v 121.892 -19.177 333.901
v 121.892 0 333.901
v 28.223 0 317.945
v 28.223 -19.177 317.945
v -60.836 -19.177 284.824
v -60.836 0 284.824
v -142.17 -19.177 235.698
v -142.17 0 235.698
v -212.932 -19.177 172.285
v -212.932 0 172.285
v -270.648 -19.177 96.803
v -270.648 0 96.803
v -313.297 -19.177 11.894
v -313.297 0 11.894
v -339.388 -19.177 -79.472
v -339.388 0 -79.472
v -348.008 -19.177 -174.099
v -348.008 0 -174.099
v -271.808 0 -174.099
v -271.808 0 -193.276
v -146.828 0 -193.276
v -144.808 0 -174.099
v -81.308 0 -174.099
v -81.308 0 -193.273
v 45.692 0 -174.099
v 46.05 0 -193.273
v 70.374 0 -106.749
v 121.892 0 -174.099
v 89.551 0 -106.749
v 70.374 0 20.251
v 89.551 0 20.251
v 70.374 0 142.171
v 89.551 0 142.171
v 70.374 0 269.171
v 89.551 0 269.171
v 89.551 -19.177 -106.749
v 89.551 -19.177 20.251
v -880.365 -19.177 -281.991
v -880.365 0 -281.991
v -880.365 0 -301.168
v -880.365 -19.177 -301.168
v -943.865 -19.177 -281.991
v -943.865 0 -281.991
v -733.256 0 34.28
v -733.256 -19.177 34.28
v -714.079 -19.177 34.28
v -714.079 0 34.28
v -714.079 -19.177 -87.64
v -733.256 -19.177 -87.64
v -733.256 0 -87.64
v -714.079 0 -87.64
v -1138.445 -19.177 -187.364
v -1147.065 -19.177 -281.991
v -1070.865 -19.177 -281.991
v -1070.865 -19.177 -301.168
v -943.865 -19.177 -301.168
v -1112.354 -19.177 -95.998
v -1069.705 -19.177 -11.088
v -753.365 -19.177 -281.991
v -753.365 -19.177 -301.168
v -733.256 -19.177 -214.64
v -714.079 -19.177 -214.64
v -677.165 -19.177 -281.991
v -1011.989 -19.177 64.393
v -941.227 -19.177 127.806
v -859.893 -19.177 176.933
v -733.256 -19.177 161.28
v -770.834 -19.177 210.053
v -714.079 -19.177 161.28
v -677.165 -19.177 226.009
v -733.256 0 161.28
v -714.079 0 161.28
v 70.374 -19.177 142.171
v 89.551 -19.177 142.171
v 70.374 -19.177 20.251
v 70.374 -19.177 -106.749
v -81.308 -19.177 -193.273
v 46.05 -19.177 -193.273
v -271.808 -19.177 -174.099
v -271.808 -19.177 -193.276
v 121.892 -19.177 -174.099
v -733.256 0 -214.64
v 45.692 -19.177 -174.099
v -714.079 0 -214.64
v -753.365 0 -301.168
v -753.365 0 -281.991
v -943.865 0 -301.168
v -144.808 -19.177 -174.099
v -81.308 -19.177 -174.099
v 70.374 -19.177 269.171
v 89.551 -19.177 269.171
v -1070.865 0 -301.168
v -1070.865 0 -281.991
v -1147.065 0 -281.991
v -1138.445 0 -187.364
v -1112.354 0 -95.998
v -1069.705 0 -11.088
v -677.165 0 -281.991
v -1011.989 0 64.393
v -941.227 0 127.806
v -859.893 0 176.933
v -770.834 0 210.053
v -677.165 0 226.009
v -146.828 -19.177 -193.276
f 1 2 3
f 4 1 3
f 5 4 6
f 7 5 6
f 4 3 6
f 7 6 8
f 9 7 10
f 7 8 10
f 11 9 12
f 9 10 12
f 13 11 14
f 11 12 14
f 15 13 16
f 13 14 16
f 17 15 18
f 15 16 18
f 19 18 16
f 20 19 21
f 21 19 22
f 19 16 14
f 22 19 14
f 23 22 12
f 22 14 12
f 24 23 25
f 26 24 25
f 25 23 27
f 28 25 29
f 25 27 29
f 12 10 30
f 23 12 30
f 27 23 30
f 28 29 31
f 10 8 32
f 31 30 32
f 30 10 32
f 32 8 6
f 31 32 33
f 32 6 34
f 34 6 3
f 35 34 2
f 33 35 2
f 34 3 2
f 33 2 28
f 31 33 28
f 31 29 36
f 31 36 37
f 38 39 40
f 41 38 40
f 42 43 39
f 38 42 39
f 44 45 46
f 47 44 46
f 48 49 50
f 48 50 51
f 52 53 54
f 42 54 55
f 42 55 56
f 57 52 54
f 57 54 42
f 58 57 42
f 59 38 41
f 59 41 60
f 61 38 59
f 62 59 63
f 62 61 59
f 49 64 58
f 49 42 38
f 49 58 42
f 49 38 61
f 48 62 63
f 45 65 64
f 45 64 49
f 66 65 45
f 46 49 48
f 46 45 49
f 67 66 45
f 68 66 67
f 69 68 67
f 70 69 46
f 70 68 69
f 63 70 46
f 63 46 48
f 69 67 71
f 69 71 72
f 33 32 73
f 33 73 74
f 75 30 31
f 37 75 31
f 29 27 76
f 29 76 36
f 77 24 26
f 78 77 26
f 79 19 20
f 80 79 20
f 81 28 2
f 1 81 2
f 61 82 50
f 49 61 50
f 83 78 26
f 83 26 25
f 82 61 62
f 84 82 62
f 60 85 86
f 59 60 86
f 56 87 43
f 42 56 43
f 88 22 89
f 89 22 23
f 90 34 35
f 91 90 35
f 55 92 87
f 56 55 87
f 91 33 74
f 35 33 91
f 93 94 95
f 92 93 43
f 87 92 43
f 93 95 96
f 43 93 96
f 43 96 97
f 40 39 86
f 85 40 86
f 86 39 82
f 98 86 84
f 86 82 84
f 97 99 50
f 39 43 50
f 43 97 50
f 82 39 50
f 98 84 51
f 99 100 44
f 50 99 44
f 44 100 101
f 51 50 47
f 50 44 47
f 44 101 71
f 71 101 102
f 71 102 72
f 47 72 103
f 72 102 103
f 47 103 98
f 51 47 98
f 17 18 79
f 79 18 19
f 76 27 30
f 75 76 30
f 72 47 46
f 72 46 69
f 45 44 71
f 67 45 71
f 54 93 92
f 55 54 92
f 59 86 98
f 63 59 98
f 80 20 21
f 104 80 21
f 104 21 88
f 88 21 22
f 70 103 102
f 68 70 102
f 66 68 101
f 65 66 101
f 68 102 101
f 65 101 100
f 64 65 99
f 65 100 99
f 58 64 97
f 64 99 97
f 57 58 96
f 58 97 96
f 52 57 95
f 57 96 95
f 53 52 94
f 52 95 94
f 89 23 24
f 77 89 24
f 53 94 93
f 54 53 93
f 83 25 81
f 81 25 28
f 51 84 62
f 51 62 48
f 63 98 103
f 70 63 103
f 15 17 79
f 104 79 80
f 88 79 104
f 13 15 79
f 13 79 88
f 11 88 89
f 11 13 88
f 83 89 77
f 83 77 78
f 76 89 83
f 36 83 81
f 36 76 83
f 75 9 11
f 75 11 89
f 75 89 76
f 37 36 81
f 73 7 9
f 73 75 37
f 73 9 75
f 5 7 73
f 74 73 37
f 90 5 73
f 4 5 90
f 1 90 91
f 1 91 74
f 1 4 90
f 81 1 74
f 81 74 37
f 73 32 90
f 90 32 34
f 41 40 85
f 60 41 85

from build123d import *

# Parameters (mm, degrees)
F0_W     = 19.177
F0_H     = 127
F1_DEPTH = 19.177


with BuildPart() as f1:
    # F0 (on Front) → F1 (new body)
    with BuildSketch(Plane.XZ):
        with BuildLine():
            Line((121.892353, -174.098967), (121.892353, 333.901033))
            ThreePointArc((121.892353, 333.901033), (-212.932177, 172.284973), (-348.007647, -174.098967))
            Line((-348.007647, -174.098967), (-271.807647, -174.098967))
            Line((-271.807647, -174.098967), (-144.807647, -174.098967))
            Line((-144.807647, -174.098967), (-81.307647, -174.098967))
            Line((-81.307647, -174.098967), (45.692353, -174.098967))
            Line((45.692353, -174.098967), (121.892353, -174.098967))
        make_face()
        with Locations((79.96203, -43.248559)):
            Rectangle(F0_W, F0_H, mode=Mode.SUBTRACT)
        with Locations((79.96203, 205.671441)):
            Rectangle(F0_W, F0_H, mode=Mode.SUBTRACT)
        Polygon((46.050249, -193.272627), (45.692353, -174.098967), (-81.307647, -174.098967), (-81.307647, -193.272627), align=None)
        Polygon((-144.807647, -174.098967), (-271.807647, -174.098967), (-271.807647, -193.275967), (-146.828368, -193.275967), align=None)
        with BuildLine():
            Line((-677.164702, -281.990628), (-677.164702, 226.009372))
            ThreePointArc((-677.164702, 226.009372), (-1011.989232, 64.393312), (-1147.064702, -281.990628))
            Line((-1147.064702, -281.990628), (-1070.864702, -281.990628))
            Line((-1070.864702, -281.990628), (-1070.864702, -301.167628))
            Line((-1070.864702, -301.167628), (-943.864702, -301.167628))
            Line((-943.864702, -301.167628), (-943.864702, -281.990628))
            Line((-943.864702, -281.990628), (-880.364702, -281.990628))
            Line((-880.364702, -281.990628), (-880.364702, -301.167628))
            Line((-880.364702, -301.167628), (-753.364702, -301.167628))
            Line((-753.364702, -301.167628), (-753.364702, -281.990628))
            Line((-753.364702, -281.990628), (-677.164702, -281.990628))
        make_face()
        with Locations((-723.667026, -151.14022)):
            Rectangle(F0_W, F0_H, mode=Mode.SUBTRACT)
        with Locations((-723.667026, 97.77978)):
            Rectangle(F0_W, F0_H, mode=Mode.SUBTRACT)
    extrude(amount=F1_DEPTH)


solid = f1.part
